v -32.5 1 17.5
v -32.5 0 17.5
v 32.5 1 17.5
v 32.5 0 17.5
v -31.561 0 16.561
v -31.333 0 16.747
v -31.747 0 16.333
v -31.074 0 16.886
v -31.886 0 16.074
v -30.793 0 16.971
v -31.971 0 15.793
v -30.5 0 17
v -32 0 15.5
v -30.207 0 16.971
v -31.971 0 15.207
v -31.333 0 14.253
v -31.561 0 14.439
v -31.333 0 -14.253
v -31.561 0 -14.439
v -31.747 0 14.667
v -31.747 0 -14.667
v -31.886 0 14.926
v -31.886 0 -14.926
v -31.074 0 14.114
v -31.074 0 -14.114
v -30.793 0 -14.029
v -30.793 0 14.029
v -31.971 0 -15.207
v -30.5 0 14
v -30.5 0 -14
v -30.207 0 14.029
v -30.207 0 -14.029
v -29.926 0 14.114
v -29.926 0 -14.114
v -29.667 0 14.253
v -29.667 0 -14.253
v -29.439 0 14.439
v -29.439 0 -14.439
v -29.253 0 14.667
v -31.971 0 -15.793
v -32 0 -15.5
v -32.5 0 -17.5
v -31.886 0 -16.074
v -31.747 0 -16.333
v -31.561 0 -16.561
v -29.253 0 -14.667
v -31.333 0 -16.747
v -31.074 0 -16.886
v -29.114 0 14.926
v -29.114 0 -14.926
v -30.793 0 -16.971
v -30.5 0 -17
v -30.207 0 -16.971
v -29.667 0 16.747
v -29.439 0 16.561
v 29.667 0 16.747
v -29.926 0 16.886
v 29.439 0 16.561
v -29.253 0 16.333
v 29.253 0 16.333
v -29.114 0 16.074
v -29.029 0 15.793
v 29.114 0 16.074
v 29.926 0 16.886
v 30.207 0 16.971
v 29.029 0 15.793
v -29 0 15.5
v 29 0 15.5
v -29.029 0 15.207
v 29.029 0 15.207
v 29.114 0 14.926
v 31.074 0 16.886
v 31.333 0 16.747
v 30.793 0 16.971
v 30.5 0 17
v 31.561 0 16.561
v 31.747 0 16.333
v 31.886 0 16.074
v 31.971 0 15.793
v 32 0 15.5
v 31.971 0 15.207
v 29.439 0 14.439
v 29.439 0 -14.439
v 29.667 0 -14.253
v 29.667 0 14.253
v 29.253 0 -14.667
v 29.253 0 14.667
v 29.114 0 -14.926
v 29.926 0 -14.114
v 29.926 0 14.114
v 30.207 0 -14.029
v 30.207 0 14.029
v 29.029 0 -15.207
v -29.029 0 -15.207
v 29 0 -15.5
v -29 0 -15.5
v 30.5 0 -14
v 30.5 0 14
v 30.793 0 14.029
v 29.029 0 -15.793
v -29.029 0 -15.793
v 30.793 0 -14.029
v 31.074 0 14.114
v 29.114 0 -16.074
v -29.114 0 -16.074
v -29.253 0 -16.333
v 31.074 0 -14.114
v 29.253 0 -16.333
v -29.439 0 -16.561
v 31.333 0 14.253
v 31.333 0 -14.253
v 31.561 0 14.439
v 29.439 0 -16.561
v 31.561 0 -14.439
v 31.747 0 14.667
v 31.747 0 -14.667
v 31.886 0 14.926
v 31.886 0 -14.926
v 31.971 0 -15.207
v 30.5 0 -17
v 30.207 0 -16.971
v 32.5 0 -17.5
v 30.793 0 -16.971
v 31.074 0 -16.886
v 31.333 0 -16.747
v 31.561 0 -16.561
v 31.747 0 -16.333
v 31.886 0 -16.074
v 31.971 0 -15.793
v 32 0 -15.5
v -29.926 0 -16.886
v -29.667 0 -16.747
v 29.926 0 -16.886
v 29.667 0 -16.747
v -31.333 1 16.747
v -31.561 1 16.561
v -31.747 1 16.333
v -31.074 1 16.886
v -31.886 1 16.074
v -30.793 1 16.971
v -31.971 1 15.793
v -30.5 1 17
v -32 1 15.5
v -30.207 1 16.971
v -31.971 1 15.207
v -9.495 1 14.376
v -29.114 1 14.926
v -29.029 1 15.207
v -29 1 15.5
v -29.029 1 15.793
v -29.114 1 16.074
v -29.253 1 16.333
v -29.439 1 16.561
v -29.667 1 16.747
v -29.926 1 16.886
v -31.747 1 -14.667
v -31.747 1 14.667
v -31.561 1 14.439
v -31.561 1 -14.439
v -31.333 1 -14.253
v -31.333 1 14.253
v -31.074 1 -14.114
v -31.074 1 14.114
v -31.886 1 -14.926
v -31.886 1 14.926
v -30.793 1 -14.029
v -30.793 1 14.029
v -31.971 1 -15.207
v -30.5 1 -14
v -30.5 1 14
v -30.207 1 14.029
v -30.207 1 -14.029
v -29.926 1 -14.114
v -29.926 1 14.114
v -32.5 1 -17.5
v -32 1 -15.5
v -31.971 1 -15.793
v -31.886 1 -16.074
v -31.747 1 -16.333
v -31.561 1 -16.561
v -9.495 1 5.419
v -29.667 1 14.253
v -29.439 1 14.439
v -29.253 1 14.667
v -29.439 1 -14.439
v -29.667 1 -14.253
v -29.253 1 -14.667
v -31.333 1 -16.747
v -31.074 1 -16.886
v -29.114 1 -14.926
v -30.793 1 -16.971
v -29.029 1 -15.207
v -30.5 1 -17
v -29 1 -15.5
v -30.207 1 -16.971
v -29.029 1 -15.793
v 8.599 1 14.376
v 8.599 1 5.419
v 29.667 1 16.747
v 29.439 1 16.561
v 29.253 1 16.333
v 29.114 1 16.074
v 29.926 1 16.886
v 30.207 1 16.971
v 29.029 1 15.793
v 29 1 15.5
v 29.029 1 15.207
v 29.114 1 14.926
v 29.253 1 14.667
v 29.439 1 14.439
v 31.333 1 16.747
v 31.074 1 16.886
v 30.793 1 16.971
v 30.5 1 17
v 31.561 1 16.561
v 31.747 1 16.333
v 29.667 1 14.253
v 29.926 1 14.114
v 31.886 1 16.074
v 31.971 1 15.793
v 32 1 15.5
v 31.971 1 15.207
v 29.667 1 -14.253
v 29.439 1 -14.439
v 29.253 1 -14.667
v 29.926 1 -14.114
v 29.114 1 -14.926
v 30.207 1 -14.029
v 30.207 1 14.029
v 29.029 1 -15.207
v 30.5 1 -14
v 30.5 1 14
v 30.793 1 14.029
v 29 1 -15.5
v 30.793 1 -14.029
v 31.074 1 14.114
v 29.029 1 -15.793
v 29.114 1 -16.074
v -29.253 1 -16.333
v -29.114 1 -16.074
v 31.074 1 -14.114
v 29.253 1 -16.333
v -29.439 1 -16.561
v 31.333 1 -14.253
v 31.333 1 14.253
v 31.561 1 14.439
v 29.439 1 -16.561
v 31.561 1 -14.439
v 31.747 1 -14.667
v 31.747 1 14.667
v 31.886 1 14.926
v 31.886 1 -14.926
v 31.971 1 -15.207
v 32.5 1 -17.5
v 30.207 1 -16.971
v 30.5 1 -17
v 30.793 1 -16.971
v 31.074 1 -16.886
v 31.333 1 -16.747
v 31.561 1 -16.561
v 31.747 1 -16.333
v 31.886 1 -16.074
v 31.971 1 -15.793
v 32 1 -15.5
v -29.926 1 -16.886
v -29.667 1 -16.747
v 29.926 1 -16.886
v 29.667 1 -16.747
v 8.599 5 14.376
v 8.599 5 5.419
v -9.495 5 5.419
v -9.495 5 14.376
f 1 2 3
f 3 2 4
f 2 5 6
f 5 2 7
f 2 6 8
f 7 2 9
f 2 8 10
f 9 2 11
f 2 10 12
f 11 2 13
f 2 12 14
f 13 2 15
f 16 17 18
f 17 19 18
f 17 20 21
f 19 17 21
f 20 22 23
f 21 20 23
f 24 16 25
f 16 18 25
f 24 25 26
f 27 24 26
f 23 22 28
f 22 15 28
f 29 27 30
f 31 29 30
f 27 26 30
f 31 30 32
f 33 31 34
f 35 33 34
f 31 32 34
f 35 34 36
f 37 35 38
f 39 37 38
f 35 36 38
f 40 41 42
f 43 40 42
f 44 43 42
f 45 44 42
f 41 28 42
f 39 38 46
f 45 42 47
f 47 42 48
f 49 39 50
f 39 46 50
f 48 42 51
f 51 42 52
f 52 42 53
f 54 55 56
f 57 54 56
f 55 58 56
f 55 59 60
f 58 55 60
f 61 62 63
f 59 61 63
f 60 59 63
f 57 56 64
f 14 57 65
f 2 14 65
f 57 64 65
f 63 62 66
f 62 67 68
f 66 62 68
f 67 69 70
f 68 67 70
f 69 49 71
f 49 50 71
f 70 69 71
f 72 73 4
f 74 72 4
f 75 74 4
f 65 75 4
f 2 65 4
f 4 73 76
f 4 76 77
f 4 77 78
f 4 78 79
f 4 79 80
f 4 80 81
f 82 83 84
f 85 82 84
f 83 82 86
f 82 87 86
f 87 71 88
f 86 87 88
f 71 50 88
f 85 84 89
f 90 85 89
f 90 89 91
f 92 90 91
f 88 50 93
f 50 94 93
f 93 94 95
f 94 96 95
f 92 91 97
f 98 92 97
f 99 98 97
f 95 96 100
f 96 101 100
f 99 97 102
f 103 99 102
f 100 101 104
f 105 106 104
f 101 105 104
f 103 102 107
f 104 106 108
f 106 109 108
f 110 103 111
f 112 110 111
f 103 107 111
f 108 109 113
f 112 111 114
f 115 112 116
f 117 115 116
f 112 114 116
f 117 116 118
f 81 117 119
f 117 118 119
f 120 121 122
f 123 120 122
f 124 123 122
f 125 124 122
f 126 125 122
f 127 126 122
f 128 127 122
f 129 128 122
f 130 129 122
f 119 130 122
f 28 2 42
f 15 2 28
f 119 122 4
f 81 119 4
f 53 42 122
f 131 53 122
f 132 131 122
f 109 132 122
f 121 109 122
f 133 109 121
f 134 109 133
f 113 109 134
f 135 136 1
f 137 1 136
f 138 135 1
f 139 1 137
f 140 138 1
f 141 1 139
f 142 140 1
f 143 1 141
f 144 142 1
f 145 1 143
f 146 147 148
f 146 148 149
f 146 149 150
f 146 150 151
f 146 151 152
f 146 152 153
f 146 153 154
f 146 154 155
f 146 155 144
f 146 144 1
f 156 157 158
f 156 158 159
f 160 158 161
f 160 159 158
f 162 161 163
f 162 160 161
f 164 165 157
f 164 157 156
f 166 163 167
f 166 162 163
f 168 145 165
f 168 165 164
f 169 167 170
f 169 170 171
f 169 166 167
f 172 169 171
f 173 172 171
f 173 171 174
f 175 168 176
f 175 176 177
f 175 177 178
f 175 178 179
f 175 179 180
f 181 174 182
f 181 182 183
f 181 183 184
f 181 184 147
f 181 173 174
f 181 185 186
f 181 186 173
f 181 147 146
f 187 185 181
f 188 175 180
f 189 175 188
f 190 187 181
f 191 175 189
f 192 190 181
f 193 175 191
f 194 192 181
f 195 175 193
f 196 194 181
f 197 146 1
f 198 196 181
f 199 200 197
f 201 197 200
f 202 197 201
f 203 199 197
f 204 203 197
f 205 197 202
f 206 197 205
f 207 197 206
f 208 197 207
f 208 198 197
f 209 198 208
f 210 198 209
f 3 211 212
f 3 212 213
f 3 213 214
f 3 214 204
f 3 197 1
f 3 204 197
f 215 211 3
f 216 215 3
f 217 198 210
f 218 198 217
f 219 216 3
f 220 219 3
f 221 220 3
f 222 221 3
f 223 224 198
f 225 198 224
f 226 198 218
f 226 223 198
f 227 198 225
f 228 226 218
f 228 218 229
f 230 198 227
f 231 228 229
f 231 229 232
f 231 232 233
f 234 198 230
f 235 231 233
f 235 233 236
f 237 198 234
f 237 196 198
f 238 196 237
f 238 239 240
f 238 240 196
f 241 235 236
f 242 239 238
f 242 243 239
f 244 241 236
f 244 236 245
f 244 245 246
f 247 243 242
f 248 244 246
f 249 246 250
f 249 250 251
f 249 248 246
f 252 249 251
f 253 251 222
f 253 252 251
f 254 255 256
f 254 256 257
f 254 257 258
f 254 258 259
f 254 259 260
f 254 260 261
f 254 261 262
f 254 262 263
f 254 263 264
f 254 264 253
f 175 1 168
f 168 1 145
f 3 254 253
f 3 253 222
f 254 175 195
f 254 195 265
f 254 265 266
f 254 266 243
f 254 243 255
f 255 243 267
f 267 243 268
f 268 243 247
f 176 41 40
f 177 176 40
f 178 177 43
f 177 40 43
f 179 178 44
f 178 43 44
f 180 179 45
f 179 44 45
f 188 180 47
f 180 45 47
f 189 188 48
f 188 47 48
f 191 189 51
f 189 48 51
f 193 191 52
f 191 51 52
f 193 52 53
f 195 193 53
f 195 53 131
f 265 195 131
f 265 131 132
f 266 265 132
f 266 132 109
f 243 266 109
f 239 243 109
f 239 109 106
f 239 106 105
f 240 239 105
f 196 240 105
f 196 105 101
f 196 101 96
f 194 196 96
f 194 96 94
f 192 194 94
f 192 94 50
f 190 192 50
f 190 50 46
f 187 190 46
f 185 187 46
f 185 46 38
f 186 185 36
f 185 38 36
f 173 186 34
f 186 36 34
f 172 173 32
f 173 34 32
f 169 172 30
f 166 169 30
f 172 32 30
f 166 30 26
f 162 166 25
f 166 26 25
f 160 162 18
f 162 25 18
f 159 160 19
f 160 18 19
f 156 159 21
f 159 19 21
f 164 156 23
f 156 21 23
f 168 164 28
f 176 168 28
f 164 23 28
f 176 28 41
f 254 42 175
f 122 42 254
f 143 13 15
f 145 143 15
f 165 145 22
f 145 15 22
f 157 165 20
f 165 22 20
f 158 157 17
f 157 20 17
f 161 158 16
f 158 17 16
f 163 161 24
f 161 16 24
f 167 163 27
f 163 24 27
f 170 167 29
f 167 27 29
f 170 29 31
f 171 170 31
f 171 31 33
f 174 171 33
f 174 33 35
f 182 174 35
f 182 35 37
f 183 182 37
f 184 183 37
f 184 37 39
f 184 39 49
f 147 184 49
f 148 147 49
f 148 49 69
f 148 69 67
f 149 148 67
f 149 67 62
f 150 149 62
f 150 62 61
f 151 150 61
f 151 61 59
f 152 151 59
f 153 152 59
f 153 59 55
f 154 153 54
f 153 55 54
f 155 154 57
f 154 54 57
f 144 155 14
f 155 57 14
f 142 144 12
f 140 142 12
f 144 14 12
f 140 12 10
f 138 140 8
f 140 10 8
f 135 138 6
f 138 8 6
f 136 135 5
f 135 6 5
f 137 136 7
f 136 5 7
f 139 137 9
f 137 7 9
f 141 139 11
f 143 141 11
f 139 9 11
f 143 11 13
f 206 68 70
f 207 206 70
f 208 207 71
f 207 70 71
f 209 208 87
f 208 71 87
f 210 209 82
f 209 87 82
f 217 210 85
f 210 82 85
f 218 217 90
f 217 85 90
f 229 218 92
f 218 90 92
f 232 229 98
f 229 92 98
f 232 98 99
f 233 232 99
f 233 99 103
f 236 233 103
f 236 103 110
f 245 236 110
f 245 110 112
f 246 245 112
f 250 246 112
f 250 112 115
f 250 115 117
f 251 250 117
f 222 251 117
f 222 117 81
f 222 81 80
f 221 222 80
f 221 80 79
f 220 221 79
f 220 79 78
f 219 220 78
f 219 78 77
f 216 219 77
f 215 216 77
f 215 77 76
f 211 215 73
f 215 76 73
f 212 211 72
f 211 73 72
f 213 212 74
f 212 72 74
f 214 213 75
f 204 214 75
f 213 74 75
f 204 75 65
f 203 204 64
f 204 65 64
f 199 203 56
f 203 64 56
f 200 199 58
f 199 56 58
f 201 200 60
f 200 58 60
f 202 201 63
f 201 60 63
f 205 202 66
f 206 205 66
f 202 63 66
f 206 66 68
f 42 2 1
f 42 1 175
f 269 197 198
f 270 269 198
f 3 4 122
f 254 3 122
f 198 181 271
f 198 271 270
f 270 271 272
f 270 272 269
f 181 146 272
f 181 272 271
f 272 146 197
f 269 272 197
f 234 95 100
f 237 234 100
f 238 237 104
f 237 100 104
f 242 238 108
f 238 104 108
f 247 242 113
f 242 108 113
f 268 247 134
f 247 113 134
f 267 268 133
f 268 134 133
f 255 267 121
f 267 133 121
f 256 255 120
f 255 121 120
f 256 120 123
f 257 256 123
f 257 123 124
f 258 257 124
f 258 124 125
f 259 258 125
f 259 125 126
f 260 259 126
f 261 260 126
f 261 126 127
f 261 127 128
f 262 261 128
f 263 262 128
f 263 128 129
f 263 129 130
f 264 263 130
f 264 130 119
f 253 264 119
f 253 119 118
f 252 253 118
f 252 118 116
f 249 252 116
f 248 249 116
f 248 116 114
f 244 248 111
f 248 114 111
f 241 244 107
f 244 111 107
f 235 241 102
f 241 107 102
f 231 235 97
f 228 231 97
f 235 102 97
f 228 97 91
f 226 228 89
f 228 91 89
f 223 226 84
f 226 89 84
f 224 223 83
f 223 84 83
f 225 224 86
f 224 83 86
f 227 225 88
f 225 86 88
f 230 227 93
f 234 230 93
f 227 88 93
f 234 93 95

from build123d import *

# Parameters (mm, degrees)
SKETCH_2_W                = 65
SKETCH_2_H                = 35
EXTRUDE_1_DEPTH           = 1
HOLE_WIZARD_3_0_3_1_D     = 3
HOLE_WIZARD_3_0_3_1_DEPTH = 12.4
HOLE_WIZARD_3_0_3_1_TIP   = 0.901290929
SKETCH_5_W                = 18.093294379
SKETCH_5_H                = 8.957076426
EXTRUDE_2_DEPTH           = 4


with BuildPart() as part:
    # 草图2 → 凸台-拉伸1 (new body)
    with BuildSketch(Plane(origin=(0, 0, 0), x_dir=(1, 0, 0), z_dir=(0, 1, 0))):
        Rectangle(SKETCH_2_W, SKETCH_2_H)
    extrude(amount=EXTRUDE_1_DEPTH)

    # Ø3.0 (3) 直径孔1
    with Locations(Plane(origin=(0, 1, 0), x_dir=(1, 0, 0), z_dir=(0, 1, 0))):
        with Locations((-30.5, 15.5), (-30.5, -15.5), (30.5, -15.5), (30.5, 15.5)):
            Hole(HOLE_WIZARD_3_0_3_1_D / 2, depth=HOLE_WIZARD_3_0_3_1_DEPTH)
            with Locations((0, 0, -(HOLE_WIZARD_3_0_3_1_DEPTH + HOLE_WIZARD_3_0_3_1_TIP / 2))):  # 118° drill point
                Cone(0, HOLE_WIZARD_3_0_3_1_D / 2, HOLE_WIZARD_3_0_3_1_TIP, mode=Mode.SUBTRACT)

    # 草图5 → 凸台-拉伸2 (add)
    with BuildSketch(Plane(origin=(0, 1, 0), x_dir=(1, 0, 0), z_dir=(0, 1, 0))):
        with Locations((-0.447853821, -9.89756945)):
            Rectangle(SKETCH_5_W, SKETCH_5_H)
    extrude(amount=EXTRUDE_2_DEPTH)


solid = part.part
